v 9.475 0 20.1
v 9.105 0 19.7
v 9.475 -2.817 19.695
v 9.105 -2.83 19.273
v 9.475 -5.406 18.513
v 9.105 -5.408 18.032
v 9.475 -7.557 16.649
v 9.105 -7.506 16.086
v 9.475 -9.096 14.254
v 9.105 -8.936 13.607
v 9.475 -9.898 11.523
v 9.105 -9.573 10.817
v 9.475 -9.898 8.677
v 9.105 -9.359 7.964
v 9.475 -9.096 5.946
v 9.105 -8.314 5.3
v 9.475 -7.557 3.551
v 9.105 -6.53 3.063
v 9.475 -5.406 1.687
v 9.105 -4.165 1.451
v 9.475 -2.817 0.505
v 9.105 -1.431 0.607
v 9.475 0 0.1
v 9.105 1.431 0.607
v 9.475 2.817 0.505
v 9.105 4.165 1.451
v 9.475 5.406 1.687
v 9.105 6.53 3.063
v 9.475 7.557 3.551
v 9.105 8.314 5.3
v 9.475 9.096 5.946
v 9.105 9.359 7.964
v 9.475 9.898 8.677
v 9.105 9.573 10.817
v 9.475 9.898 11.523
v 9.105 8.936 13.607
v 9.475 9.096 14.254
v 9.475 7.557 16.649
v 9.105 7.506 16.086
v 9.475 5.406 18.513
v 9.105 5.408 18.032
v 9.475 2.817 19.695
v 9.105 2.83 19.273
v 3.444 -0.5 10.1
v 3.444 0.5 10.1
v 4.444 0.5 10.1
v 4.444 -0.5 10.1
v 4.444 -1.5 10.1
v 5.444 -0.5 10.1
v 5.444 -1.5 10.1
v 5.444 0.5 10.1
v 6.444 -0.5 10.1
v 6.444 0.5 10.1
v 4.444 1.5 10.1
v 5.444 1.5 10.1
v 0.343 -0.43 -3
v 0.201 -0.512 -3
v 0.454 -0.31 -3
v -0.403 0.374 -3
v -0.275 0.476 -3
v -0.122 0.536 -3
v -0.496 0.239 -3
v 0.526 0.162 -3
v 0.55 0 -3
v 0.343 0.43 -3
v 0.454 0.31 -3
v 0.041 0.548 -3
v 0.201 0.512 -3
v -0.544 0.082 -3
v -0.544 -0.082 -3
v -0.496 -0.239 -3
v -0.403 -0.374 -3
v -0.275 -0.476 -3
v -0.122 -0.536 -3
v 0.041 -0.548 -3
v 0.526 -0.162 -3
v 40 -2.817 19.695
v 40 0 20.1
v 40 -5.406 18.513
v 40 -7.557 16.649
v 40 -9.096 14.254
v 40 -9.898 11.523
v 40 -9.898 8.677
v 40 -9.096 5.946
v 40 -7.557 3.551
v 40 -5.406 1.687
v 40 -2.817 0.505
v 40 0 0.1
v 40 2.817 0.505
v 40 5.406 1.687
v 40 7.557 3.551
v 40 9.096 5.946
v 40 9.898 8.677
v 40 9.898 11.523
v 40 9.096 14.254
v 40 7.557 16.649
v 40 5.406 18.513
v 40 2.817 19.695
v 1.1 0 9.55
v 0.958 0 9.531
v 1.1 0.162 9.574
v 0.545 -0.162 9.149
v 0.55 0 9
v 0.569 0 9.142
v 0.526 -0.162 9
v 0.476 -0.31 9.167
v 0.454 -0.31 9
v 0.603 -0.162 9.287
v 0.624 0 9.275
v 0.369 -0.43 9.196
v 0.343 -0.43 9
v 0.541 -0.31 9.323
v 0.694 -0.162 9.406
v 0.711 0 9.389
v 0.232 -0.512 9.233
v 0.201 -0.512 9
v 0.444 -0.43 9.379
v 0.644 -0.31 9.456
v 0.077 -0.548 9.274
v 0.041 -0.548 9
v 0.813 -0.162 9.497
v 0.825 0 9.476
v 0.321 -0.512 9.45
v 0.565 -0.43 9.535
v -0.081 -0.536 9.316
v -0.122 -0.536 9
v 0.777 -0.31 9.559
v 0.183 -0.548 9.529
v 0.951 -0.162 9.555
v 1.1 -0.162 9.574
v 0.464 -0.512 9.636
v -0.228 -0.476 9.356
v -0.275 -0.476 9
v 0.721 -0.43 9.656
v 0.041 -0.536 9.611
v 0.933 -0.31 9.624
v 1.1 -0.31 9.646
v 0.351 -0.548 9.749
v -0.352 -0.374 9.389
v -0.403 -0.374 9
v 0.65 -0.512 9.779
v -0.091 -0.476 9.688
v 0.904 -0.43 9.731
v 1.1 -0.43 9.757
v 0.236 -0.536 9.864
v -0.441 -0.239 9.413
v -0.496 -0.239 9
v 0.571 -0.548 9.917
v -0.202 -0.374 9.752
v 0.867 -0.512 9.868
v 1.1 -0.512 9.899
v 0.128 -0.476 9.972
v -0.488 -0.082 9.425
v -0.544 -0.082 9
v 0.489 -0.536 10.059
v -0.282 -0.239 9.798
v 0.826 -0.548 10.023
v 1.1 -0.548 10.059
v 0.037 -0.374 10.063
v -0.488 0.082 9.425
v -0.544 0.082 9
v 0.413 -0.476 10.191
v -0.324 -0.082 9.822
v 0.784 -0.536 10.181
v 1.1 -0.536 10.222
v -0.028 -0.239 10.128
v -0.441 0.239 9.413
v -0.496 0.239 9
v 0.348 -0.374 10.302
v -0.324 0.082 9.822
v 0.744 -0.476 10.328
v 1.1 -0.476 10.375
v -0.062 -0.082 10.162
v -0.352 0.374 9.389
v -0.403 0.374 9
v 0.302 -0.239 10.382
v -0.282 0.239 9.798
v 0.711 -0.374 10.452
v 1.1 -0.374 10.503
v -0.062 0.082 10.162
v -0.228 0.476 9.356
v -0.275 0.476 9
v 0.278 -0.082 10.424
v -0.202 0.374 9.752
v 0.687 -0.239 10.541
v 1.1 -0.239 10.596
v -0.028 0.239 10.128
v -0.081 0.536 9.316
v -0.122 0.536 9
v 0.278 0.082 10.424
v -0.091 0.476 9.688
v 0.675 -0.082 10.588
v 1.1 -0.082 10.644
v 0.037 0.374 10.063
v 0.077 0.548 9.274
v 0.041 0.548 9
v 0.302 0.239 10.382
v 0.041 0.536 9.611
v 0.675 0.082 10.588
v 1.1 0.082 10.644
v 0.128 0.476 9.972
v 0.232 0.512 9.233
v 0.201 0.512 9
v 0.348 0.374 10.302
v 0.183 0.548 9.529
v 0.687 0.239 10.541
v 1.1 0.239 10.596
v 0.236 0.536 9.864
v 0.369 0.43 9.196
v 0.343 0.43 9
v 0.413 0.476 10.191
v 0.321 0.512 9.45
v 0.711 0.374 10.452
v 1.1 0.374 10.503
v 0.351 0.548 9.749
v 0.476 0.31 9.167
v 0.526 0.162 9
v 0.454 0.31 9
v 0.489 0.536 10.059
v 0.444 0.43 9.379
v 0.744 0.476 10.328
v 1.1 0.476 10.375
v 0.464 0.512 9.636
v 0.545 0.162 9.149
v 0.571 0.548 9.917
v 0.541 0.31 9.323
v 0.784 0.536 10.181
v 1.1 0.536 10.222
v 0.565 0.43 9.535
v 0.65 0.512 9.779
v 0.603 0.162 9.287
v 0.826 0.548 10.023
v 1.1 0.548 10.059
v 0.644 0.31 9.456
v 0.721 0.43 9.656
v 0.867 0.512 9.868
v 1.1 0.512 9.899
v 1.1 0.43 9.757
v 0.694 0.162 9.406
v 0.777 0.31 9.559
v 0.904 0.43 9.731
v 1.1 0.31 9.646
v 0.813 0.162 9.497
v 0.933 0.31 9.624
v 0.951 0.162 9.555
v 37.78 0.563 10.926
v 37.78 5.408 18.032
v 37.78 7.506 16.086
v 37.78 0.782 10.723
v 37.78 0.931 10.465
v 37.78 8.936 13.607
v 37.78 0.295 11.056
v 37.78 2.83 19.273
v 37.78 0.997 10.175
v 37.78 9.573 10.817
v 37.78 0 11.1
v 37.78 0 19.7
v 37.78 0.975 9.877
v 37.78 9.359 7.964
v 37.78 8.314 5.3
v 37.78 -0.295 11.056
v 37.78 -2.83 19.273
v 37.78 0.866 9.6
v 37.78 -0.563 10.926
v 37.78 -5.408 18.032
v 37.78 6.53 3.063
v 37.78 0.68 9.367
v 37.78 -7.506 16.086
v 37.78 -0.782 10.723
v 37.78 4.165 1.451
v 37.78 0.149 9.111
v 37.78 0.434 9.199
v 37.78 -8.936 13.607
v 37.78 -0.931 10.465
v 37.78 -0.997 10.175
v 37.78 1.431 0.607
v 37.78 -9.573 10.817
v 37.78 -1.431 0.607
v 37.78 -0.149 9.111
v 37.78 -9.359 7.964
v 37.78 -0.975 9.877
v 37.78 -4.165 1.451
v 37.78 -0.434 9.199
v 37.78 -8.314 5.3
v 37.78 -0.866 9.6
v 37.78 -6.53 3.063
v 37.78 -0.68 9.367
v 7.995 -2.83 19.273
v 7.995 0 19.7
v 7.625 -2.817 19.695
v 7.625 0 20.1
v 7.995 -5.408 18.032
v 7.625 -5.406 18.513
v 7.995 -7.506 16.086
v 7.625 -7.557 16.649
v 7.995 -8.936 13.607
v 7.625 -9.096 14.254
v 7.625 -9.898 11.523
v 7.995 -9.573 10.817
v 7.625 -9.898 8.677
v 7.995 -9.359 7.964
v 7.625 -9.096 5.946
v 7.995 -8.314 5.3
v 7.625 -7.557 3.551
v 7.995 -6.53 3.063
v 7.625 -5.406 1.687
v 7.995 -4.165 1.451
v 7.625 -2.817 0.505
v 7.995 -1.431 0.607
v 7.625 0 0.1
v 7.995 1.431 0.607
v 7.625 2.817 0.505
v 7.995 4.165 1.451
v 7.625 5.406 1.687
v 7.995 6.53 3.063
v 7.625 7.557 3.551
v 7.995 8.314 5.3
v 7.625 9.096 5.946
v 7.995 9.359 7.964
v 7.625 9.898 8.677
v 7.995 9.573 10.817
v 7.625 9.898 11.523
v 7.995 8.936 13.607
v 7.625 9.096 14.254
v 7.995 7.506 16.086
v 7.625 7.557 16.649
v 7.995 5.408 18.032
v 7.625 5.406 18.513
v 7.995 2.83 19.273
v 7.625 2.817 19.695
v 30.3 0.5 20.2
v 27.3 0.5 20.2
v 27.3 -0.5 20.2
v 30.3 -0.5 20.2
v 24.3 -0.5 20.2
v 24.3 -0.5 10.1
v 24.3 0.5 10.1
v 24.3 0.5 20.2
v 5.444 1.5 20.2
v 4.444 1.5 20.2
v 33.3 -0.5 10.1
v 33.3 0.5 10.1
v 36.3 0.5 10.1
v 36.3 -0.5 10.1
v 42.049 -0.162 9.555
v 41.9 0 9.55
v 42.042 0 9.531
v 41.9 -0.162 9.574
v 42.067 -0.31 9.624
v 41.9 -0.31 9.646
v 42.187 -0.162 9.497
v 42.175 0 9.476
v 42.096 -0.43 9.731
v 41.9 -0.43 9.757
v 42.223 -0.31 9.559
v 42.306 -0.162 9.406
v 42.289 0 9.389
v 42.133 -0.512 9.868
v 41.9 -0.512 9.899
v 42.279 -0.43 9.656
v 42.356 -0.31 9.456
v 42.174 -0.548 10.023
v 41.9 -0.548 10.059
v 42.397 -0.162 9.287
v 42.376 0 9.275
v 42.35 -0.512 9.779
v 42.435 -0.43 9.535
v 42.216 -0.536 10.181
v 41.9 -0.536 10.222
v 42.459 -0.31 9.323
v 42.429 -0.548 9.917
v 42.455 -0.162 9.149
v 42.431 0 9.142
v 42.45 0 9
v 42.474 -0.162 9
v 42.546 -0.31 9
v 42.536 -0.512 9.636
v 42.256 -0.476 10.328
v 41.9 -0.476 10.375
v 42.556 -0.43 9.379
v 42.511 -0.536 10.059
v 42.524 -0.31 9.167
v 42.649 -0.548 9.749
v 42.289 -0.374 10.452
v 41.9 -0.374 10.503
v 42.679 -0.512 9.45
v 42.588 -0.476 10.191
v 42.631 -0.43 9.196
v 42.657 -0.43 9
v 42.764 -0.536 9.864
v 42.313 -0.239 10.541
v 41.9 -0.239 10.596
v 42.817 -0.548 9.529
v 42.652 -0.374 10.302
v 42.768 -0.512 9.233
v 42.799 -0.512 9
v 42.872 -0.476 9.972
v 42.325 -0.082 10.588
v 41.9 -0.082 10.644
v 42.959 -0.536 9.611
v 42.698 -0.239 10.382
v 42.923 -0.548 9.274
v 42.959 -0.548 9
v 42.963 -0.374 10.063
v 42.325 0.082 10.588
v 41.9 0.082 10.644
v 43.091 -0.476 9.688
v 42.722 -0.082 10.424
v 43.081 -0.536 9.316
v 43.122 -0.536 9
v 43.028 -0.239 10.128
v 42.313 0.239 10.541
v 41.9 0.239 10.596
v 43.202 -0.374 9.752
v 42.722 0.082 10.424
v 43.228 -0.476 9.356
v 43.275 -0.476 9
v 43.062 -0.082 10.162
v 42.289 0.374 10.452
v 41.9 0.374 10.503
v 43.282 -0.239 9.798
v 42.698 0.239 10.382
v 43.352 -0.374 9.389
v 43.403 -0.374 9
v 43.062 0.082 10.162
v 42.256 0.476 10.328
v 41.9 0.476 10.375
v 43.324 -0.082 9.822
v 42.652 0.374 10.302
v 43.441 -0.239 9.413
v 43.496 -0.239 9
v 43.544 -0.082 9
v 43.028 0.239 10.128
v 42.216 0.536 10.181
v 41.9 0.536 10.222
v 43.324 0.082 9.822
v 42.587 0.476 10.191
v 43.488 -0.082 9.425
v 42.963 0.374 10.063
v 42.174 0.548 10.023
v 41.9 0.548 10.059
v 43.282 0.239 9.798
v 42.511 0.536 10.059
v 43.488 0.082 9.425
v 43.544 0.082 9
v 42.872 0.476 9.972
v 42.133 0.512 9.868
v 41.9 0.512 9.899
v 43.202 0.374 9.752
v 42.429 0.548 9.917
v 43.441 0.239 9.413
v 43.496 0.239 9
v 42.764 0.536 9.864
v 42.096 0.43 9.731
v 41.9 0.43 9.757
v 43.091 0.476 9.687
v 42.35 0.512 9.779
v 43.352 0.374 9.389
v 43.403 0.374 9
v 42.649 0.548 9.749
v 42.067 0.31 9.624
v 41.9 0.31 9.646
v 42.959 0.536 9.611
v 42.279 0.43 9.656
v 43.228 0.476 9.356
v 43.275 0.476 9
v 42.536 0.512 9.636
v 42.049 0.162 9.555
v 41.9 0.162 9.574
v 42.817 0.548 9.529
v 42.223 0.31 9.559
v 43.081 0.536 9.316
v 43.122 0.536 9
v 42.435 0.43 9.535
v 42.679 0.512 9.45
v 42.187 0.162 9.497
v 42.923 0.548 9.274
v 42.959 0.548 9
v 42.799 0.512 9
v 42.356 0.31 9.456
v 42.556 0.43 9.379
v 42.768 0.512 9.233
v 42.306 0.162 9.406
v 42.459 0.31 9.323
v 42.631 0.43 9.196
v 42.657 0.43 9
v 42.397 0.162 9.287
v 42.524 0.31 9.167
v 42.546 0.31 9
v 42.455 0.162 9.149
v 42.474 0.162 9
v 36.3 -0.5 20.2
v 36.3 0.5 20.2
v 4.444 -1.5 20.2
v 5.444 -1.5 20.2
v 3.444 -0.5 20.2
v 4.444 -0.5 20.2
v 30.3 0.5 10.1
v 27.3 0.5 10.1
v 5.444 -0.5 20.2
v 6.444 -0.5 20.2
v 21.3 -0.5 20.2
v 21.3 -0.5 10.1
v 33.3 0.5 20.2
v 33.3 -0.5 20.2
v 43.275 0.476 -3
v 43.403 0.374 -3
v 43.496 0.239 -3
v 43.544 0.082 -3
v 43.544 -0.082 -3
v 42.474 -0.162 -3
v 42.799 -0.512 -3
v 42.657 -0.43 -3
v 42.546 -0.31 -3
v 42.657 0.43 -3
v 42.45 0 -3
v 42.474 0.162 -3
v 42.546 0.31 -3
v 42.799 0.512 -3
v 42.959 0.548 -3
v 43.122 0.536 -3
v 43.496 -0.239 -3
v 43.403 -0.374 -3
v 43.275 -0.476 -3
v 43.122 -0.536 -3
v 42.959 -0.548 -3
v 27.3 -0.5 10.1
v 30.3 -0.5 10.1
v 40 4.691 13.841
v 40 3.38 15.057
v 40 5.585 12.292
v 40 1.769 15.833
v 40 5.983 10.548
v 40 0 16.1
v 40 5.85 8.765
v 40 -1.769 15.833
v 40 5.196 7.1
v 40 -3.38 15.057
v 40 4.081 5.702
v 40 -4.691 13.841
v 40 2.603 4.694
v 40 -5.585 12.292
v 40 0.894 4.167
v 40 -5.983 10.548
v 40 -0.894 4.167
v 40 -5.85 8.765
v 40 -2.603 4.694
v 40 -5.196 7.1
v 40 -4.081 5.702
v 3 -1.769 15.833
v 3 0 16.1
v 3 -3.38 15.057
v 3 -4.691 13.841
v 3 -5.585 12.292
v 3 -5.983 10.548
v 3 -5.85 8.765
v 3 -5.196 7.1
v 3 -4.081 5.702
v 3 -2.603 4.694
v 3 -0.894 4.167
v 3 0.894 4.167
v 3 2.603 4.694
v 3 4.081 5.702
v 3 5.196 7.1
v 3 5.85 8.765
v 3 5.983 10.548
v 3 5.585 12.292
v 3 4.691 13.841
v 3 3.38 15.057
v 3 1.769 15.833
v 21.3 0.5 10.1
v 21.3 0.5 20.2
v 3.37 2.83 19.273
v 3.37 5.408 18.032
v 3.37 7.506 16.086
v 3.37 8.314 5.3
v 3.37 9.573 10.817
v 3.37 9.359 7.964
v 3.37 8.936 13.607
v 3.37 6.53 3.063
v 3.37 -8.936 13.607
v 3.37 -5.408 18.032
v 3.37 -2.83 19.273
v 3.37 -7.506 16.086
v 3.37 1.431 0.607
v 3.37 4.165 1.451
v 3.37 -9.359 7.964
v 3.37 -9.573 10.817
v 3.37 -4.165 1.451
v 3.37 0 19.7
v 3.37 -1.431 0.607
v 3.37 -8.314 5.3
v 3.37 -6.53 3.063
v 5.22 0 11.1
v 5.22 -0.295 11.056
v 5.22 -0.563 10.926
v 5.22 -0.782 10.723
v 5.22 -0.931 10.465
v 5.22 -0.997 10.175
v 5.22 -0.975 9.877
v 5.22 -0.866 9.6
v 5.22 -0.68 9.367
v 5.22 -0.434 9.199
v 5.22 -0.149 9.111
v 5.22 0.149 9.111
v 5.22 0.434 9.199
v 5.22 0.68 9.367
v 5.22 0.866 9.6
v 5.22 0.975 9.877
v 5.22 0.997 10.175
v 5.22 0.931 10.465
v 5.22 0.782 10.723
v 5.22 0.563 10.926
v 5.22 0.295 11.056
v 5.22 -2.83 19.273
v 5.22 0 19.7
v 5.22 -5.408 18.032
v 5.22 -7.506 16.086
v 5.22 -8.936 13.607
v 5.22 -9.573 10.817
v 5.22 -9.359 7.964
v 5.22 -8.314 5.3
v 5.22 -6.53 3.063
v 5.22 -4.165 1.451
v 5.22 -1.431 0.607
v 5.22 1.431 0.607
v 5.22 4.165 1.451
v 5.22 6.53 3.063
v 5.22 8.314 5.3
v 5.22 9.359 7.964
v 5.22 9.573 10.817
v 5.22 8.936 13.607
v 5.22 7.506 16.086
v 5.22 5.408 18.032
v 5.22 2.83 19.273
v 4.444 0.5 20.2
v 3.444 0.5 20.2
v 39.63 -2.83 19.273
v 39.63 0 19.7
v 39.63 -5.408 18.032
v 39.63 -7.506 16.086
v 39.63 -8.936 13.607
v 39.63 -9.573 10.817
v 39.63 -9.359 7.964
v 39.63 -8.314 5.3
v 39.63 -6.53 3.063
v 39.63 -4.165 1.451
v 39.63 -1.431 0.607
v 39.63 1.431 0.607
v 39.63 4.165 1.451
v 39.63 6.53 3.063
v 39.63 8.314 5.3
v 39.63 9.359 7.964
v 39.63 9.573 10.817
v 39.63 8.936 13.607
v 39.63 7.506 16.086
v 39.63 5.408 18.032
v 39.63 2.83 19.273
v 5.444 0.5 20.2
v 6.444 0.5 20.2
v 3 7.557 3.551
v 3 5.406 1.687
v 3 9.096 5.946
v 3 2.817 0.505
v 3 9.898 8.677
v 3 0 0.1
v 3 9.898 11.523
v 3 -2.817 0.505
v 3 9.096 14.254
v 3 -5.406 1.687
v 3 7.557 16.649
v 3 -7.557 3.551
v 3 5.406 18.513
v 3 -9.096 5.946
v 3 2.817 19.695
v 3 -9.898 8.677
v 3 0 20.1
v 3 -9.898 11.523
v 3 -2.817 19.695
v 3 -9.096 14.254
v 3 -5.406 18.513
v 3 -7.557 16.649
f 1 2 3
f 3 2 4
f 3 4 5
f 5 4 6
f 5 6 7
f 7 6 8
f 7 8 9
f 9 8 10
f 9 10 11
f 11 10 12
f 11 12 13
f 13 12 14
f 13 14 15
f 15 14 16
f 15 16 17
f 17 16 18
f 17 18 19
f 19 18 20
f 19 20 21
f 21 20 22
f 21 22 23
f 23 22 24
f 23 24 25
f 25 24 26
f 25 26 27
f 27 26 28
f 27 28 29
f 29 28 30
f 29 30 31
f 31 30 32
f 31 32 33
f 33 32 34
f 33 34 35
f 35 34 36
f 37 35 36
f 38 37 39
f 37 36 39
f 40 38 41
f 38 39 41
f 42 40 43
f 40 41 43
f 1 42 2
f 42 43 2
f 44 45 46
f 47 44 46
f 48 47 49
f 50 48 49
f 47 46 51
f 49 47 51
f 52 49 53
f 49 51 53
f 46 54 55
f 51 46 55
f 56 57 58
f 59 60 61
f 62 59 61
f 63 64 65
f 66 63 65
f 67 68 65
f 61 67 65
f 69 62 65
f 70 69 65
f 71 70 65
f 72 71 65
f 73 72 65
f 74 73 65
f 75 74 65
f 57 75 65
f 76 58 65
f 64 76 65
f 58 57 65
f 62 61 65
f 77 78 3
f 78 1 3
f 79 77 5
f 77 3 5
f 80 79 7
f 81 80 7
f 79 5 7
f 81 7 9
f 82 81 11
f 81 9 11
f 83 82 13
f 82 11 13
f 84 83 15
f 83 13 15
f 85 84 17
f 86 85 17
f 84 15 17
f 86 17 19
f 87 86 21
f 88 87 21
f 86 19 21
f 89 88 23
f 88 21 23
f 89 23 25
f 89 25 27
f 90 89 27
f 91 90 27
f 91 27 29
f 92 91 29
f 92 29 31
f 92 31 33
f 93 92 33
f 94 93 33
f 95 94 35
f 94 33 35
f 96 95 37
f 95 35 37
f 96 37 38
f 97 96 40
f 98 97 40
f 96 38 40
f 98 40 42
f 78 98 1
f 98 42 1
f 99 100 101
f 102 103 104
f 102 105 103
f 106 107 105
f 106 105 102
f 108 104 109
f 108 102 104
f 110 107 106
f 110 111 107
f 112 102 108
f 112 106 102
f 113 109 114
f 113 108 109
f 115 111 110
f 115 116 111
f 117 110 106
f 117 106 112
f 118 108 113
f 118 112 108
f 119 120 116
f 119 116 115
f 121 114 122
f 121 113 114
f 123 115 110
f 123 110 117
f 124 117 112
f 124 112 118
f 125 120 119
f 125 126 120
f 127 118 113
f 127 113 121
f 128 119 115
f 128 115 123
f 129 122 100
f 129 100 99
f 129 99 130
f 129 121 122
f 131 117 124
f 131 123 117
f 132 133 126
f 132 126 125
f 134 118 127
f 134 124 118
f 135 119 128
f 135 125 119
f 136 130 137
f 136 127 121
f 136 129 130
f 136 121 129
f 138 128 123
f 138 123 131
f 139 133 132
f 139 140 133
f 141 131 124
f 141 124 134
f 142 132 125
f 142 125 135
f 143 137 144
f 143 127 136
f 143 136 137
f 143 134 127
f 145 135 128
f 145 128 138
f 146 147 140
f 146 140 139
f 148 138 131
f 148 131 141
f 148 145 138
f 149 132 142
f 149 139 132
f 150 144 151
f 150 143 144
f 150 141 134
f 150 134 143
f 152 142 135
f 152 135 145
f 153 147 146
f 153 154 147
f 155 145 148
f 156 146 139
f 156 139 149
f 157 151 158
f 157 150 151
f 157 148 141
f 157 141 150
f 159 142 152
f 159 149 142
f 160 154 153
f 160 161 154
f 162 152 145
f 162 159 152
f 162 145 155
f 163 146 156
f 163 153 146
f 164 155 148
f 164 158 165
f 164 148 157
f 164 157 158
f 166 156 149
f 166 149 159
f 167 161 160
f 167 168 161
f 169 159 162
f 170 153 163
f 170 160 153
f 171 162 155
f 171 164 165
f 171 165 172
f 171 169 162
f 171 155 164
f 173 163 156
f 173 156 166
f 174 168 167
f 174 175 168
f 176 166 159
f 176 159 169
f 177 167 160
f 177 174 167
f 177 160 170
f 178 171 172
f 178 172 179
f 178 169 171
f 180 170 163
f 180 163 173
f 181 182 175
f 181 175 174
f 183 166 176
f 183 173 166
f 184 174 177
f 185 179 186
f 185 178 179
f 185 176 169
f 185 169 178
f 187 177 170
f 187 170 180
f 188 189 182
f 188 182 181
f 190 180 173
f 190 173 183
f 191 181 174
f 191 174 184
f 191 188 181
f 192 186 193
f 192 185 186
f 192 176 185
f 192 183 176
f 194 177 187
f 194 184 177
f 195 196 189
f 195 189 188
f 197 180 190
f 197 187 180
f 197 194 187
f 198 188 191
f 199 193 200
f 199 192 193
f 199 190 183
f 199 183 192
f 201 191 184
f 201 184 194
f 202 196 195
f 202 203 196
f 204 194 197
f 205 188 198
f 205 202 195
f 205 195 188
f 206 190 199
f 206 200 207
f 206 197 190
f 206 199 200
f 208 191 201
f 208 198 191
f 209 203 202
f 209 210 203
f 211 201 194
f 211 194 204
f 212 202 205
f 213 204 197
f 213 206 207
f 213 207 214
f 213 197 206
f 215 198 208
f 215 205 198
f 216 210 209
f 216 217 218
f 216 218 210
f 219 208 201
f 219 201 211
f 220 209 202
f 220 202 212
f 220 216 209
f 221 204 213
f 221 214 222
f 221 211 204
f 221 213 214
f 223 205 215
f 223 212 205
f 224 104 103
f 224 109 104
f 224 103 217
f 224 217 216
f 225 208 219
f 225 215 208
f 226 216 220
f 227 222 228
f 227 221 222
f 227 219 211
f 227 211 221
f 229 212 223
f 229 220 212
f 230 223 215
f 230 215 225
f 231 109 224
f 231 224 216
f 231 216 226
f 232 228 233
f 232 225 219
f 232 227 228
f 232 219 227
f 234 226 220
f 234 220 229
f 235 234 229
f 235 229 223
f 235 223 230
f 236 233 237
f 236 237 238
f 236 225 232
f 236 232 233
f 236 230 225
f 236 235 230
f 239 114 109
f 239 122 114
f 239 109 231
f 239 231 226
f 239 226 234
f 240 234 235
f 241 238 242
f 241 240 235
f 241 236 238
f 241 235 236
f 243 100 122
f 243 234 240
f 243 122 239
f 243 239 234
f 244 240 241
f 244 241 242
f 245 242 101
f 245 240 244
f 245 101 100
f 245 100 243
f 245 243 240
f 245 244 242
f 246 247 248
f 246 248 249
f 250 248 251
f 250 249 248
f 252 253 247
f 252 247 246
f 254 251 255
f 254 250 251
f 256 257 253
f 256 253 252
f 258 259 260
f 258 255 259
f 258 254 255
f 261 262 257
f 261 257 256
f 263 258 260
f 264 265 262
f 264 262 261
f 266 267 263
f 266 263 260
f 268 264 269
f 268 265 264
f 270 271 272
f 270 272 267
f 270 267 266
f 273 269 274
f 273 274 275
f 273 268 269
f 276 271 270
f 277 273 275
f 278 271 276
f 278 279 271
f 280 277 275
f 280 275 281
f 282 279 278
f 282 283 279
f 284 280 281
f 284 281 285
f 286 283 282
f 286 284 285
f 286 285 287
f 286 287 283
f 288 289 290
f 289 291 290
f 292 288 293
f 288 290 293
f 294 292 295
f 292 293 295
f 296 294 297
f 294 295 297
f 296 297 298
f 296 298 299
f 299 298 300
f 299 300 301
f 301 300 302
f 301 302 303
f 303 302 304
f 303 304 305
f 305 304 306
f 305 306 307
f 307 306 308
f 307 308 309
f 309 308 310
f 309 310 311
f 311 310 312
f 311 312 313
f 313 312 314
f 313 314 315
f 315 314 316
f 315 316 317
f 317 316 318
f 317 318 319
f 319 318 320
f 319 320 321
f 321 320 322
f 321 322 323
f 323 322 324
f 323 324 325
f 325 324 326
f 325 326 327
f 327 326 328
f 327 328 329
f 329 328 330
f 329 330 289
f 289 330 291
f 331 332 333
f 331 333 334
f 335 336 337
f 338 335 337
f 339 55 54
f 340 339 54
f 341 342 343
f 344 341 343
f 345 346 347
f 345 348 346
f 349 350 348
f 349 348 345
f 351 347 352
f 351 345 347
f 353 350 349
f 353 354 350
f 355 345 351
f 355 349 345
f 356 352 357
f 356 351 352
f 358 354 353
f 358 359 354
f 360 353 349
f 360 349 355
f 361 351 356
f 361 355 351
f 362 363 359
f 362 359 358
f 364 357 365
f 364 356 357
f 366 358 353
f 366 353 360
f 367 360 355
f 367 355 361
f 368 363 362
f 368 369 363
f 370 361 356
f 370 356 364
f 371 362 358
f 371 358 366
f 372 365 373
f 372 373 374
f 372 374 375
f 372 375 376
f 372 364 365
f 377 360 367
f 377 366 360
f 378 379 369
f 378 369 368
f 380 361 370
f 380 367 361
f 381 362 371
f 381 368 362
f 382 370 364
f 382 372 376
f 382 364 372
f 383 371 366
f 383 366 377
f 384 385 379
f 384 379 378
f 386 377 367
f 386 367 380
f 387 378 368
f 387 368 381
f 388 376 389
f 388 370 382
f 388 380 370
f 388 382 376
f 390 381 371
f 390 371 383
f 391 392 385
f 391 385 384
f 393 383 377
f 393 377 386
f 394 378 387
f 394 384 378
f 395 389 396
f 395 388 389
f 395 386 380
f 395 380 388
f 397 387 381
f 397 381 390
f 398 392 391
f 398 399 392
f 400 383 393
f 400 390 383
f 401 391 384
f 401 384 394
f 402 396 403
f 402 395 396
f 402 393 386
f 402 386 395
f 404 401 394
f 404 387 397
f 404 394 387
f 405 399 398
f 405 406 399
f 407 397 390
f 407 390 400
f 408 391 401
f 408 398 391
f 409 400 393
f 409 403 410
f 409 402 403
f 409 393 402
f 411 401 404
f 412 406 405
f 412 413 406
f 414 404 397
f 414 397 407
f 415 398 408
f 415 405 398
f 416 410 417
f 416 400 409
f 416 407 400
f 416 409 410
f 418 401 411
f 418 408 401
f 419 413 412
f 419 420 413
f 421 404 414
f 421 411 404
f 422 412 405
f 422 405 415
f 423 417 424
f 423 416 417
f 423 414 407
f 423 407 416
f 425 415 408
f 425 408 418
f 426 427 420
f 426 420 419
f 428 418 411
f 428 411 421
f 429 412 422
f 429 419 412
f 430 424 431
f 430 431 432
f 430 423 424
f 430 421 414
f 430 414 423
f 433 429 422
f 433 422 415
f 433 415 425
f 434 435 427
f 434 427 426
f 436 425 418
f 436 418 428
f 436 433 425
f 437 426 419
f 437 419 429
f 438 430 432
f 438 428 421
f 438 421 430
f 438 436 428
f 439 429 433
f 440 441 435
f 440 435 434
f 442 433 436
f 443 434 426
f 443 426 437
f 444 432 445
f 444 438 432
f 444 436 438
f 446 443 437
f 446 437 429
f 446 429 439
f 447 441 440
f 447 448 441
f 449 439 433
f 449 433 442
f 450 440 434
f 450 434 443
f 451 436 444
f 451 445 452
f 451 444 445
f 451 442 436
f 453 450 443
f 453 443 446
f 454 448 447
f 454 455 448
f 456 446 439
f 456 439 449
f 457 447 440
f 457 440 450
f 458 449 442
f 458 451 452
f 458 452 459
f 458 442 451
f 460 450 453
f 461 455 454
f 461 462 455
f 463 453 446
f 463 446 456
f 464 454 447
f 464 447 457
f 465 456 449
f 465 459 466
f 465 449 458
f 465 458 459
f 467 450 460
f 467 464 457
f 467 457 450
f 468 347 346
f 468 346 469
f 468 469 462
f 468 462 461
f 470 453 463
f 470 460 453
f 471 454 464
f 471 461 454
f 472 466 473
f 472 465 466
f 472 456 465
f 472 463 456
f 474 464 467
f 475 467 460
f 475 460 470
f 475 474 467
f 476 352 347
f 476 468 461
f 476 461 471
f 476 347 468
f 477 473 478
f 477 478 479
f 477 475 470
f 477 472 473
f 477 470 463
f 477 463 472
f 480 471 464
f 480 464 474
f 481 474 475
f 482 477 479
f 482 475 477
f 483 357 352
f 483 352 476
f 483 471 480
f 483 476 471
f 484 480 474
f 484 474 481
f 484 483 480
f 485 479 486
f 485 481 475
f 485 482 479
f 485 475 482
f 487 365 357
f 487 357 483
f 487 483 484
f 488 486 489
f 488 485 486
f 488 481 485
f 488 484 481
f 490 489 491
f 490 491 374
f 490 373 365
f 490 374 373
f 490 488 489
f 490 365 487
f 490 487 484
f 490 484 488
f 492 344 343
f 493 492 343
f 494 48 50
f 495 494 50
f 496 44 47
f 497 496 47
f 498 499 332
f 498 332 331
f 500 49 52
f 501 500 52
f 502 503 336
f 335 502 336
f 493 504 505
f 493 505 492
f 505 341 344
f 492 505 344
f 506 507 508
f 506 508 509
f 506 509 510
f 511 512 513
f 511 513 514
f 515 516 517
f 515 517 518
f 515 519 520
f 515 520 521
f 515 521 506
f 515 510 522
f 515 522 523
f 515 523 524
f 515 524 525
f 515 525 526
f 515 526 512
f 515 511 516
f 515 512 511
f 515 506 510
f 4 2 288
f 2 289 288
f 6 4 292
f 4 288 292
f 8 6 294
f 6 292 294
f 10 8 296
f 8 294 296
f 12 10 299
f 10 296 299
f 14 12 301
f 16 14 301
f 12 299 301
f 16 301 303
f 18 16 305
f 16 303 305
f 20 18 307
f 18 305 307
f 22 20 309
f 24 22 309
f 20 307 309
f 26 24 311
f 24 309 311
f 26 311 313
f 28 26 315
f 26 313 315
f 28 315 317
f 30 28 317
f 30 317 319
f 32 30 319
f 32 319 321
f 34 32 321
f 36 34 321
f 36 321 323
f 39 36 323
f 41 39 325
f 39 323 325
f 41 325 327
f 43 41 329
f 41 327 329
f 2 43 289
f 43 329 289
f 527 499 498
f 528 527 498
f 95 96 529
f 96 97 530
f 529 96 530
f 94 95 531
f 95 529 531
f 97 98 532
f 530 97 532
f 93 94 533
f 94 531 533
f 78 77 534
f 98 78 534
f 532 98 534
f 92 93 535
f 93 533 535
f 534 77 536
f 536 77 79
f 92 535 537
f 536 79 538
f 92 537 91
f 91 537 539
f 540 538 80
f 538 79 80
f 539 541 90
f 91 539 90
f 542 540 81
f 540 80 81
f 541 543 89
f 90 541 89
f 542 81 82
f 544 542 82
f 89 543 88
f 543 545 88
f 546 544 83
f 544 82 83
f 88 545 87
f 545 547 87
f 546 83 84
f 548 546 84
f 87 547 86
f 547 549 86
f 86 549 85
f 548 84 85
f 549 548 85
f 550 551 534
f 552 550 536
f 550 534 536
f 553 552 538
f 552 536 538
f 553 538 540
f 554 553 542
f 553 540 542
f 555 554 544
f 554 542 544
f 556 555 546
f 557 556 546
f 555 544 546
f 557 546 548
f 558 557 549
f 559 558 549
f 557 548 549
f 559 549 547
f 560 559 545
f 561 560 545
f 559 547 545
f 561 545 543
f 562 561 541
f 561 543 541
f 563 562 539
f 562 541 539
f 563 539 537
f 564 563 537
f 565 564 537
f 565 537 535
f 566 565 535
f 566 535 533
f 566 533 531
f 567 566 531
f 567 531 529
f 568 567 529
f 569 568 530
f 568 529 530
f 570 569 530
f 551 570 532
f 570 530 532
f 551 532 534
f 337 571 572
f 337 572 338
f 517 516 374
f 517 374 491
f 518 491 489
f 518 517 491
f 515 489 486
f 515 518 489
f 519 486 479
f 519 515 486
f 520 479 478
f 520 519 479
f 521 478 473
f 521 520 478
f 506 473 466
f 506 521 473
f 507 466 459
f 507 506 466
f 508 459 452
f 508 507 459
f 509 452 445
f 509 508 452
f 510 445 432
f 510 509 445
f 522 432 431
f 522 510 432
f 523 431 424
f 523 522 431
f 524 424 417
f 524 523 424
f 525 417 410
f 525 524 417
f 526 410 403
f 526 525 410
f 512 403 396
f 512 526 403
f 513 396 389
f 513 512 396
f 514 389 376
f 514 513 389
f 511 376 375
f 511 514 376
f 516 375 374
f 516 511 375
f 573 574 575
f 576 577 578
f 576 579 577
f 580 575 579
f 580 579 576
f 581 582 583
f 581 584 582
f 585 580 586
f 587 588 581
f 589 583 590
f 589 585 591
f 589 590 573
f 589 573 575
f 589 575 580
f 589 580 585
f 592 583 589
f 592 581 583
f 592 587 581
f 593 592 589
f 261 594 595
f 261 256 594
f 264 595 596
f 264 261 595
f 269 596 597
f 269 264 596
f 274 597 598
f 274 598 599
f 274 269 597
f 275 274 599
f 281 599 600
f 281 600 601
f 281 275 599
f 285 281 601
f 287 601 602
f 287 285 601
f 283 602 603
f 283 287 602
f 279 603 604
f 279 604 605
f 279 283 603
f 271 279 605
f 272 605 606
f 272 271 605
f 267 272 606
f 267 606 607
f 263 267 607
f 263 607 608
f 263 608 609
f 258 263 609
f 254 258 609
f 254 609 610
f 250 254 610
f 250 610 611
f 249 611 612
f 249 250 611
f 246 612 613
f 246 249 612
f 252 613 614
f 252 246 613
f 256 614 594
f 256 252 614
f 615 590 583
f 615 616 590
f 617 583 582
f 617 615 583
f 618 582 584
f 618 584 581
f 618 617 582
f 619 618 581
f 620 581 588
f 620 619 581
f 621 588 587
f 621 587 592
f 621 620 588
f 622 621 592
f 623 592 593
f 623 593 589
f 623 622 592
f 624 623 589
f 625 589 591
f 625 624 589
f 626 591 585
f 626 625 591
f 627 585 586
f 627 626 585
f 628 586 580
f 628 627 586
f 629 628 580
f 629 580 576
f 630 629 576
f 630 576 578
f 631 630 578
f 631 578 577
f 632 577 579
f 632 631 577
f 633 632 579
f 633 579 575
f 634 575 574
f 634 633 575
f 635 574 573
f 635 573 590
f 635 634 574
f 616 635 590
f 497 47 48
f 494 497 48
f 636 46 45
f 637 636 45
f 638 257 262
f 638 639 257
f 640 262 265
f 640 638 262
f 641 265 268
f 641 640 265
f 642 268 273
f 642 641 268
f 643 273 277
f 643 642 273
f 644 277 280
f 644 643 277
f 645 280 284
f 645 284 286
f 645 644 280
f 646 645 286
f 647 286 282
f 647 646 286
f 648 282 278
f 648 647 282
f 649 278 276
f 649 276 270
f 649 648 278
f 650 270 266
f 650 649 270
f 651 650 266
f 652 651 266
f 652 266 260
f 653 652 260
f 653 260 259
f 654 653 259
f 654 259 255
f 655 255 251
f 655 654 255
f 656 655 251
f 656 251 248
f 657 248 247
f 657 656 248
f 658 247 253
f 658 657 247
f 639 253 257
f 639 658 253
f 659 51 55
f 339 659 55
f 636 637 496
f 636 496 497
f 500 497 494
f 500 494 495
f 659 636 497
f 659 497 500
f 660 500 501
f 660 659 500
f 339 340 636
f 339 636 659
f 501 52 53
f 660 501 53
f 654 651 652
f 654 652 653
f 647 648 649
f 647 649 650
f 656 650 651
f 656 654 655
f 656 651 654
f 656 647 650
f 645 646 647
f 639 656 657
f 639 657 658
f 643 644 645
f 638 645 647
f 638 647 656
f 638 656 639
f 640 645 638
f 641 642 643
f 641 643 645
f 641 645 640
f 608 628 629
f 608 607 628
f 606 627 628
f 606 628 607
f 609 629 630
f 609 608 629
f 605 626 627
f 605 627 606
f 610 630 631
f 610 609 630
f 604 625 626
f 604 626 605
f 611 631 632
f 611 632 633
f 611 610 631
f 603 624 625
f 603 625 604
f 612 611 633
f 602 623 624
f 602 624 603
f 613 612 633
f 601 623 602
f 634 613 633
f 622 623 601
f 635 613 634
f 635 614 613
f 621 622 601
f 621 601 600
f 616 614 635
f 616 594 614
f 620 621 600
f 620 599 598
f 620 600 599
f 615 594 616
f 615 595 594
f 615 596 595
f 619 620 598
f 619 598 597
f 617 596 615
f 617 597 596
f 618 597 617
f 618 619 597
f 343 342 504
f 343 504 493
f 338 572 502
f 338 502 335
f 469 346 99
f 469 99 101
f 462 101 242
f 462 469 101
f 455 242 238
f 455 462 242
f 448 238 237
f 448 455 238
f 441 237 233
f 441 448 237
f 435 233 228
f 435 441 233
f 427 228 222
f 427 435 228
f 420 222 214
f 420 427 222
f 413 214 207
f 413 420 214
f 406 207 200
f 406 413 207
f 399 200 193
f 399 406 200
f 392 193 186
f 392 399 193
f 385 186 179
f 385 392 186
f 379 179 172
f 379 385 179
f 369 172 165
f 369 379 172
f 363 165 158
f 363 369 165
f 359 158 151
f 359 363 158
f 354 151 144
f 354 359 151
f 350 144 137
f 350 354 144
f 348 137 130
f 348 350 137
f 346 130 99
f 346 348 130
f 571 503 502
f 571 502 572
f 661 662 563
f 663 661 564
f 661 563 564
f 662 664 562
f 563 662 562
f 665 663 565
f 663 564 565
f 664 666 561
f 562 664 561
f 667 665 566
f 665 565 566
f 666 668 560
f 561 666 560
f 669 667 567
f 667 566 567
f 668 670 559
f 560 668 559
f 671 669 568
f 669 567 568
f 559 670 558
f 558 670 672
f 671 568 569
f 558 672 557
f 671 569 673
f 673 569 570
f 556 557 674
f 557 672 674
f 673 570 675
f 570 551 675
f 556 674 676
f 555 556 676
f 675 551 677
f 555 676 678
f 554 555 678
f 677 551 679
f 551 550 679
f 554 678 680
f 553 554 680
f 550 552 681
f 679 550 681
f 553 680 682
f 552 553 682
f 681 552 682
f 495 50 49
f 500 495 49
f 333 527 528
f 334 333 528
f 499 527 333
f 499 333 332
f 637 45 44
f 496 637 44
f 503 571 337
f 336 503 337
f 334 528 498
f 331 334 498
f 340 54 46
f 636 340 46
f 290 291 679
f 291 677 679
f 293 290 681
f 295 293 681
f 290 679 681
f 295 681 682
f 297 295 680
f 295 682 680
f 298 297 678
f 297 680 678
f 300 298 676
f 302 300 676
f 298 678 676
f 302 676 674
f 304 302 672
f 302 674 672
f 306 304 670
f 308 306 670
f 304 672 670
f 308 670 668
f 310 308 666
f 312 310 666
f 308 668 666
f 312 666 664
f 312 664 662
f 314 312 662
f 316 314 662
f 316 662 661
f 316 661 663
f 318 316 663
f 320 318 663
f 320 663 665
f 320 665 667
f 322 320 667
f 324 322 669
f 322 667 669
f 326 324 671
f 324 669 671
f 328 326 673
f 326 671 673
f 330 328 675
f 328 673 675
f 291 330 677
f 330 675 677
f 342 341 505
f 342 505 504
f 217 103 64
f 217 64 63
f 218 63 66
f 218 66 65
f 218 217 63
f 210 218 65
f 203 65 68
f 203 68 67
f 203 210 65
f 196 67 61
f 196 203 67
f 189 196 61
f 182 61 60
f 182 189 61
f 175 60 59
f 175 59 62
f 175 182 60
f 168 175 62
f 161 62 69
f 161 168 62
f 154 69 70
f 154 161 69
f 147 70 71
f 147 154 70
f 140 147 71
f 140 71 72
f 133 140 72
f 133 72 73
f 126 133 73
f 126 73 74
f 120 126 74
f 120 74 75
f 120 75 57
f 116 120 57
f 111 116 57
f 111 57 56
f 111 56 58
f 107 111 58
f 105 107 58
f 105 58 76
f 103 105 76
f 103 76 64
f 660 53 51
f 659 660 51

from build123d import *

# Parameters (mm, degrees)
SKETCH_R    = 0.55
SKETCH004_W = 3
SKETCH004_H = 1
PAD_DEPTH   = 10.1


with BuildPart() as sweep_body:
    # Sweep: sweep along a path in Sketch001
    with BuildLine(Plane.XZ) as sweep_path:
        Line((0, -3), (0, 9))
        ThreePointArc((0, 9), (0.322187, 9.777822), (1.100013, 10.1))
        Line((1.100013, 10.1), (41.9, 10.1))
        ThreePointArc((41.9, 10.1), (42.677817, 9.777817), (43, 9))
        Line((43, 9), (43, -3))
    # Sketch → Sweep (sweep)
    with BuildSketch(Plane.XY.offset(-2)):
        Circle(SKETCH_R)
    sweep(path=sweep_path.line)


with BuildPart() as revolution:
    # Sketch002 → Revolution (revolve)
    with BuildSketch(Plane.XZ):
        Polygon((3, 20.1), (3, 16.1), (40, 16.1), (40, 20.1), (9.475, 20.1), (9.105, 19.7), (7.995, 19.7), (7.625, 20.1), align=None)
    revolve(axis=Axis((6.97588, 0, 10.1), (1, 0, 0)))


with BuildPart() as revolution001:
    # Sketch003 → Revolution001 (revolve)
    with BuildSketch(Plane.XZ):
        Polygon((3.37, 19.7), (5.22, 19.7), (5.22, 11.1), (37.78, 11.1), (37.78, 19.7), (39.63, 19.7), (39.63, 10.1), (3.37, 10.1), align=None)
    revolve(axis=Axis((6.97588, 0, 10.1), (1, 0, 0)))


with BuildPart() as pad:
    # Sketch004 → Pad (new body)
    with BuildSketch(Plane.XY.offset(10.1)):
        with Locations((34.8, 0)):
            Rectangle(SKETCH004_W, SKETCH004_H)
        with Locations((28.8, 0)):
            Rectangle(SKETCH004_W, SKETCH004_H)
        with Locations((22.8, 0)):
            Rectangle(SKETCH004_W, SKETCH004_H)
        Polygon((4.444, 0.5), (3.444, 0.5), (3.444, -0.5), (4.444, -0.5), (4.444, -1.5), (5.444, -1.5), (5.444, -0.5), (6.444, -0.5), (6.444, 0.5), (5.444, 0.5), (5.444, 1.5), (4.444, 1.5), align=None)
    extrude(amount=PAD_DEPTH)


solid = Compound([sweep_body.part, revolution.part, revolution001.part, pad.part])
